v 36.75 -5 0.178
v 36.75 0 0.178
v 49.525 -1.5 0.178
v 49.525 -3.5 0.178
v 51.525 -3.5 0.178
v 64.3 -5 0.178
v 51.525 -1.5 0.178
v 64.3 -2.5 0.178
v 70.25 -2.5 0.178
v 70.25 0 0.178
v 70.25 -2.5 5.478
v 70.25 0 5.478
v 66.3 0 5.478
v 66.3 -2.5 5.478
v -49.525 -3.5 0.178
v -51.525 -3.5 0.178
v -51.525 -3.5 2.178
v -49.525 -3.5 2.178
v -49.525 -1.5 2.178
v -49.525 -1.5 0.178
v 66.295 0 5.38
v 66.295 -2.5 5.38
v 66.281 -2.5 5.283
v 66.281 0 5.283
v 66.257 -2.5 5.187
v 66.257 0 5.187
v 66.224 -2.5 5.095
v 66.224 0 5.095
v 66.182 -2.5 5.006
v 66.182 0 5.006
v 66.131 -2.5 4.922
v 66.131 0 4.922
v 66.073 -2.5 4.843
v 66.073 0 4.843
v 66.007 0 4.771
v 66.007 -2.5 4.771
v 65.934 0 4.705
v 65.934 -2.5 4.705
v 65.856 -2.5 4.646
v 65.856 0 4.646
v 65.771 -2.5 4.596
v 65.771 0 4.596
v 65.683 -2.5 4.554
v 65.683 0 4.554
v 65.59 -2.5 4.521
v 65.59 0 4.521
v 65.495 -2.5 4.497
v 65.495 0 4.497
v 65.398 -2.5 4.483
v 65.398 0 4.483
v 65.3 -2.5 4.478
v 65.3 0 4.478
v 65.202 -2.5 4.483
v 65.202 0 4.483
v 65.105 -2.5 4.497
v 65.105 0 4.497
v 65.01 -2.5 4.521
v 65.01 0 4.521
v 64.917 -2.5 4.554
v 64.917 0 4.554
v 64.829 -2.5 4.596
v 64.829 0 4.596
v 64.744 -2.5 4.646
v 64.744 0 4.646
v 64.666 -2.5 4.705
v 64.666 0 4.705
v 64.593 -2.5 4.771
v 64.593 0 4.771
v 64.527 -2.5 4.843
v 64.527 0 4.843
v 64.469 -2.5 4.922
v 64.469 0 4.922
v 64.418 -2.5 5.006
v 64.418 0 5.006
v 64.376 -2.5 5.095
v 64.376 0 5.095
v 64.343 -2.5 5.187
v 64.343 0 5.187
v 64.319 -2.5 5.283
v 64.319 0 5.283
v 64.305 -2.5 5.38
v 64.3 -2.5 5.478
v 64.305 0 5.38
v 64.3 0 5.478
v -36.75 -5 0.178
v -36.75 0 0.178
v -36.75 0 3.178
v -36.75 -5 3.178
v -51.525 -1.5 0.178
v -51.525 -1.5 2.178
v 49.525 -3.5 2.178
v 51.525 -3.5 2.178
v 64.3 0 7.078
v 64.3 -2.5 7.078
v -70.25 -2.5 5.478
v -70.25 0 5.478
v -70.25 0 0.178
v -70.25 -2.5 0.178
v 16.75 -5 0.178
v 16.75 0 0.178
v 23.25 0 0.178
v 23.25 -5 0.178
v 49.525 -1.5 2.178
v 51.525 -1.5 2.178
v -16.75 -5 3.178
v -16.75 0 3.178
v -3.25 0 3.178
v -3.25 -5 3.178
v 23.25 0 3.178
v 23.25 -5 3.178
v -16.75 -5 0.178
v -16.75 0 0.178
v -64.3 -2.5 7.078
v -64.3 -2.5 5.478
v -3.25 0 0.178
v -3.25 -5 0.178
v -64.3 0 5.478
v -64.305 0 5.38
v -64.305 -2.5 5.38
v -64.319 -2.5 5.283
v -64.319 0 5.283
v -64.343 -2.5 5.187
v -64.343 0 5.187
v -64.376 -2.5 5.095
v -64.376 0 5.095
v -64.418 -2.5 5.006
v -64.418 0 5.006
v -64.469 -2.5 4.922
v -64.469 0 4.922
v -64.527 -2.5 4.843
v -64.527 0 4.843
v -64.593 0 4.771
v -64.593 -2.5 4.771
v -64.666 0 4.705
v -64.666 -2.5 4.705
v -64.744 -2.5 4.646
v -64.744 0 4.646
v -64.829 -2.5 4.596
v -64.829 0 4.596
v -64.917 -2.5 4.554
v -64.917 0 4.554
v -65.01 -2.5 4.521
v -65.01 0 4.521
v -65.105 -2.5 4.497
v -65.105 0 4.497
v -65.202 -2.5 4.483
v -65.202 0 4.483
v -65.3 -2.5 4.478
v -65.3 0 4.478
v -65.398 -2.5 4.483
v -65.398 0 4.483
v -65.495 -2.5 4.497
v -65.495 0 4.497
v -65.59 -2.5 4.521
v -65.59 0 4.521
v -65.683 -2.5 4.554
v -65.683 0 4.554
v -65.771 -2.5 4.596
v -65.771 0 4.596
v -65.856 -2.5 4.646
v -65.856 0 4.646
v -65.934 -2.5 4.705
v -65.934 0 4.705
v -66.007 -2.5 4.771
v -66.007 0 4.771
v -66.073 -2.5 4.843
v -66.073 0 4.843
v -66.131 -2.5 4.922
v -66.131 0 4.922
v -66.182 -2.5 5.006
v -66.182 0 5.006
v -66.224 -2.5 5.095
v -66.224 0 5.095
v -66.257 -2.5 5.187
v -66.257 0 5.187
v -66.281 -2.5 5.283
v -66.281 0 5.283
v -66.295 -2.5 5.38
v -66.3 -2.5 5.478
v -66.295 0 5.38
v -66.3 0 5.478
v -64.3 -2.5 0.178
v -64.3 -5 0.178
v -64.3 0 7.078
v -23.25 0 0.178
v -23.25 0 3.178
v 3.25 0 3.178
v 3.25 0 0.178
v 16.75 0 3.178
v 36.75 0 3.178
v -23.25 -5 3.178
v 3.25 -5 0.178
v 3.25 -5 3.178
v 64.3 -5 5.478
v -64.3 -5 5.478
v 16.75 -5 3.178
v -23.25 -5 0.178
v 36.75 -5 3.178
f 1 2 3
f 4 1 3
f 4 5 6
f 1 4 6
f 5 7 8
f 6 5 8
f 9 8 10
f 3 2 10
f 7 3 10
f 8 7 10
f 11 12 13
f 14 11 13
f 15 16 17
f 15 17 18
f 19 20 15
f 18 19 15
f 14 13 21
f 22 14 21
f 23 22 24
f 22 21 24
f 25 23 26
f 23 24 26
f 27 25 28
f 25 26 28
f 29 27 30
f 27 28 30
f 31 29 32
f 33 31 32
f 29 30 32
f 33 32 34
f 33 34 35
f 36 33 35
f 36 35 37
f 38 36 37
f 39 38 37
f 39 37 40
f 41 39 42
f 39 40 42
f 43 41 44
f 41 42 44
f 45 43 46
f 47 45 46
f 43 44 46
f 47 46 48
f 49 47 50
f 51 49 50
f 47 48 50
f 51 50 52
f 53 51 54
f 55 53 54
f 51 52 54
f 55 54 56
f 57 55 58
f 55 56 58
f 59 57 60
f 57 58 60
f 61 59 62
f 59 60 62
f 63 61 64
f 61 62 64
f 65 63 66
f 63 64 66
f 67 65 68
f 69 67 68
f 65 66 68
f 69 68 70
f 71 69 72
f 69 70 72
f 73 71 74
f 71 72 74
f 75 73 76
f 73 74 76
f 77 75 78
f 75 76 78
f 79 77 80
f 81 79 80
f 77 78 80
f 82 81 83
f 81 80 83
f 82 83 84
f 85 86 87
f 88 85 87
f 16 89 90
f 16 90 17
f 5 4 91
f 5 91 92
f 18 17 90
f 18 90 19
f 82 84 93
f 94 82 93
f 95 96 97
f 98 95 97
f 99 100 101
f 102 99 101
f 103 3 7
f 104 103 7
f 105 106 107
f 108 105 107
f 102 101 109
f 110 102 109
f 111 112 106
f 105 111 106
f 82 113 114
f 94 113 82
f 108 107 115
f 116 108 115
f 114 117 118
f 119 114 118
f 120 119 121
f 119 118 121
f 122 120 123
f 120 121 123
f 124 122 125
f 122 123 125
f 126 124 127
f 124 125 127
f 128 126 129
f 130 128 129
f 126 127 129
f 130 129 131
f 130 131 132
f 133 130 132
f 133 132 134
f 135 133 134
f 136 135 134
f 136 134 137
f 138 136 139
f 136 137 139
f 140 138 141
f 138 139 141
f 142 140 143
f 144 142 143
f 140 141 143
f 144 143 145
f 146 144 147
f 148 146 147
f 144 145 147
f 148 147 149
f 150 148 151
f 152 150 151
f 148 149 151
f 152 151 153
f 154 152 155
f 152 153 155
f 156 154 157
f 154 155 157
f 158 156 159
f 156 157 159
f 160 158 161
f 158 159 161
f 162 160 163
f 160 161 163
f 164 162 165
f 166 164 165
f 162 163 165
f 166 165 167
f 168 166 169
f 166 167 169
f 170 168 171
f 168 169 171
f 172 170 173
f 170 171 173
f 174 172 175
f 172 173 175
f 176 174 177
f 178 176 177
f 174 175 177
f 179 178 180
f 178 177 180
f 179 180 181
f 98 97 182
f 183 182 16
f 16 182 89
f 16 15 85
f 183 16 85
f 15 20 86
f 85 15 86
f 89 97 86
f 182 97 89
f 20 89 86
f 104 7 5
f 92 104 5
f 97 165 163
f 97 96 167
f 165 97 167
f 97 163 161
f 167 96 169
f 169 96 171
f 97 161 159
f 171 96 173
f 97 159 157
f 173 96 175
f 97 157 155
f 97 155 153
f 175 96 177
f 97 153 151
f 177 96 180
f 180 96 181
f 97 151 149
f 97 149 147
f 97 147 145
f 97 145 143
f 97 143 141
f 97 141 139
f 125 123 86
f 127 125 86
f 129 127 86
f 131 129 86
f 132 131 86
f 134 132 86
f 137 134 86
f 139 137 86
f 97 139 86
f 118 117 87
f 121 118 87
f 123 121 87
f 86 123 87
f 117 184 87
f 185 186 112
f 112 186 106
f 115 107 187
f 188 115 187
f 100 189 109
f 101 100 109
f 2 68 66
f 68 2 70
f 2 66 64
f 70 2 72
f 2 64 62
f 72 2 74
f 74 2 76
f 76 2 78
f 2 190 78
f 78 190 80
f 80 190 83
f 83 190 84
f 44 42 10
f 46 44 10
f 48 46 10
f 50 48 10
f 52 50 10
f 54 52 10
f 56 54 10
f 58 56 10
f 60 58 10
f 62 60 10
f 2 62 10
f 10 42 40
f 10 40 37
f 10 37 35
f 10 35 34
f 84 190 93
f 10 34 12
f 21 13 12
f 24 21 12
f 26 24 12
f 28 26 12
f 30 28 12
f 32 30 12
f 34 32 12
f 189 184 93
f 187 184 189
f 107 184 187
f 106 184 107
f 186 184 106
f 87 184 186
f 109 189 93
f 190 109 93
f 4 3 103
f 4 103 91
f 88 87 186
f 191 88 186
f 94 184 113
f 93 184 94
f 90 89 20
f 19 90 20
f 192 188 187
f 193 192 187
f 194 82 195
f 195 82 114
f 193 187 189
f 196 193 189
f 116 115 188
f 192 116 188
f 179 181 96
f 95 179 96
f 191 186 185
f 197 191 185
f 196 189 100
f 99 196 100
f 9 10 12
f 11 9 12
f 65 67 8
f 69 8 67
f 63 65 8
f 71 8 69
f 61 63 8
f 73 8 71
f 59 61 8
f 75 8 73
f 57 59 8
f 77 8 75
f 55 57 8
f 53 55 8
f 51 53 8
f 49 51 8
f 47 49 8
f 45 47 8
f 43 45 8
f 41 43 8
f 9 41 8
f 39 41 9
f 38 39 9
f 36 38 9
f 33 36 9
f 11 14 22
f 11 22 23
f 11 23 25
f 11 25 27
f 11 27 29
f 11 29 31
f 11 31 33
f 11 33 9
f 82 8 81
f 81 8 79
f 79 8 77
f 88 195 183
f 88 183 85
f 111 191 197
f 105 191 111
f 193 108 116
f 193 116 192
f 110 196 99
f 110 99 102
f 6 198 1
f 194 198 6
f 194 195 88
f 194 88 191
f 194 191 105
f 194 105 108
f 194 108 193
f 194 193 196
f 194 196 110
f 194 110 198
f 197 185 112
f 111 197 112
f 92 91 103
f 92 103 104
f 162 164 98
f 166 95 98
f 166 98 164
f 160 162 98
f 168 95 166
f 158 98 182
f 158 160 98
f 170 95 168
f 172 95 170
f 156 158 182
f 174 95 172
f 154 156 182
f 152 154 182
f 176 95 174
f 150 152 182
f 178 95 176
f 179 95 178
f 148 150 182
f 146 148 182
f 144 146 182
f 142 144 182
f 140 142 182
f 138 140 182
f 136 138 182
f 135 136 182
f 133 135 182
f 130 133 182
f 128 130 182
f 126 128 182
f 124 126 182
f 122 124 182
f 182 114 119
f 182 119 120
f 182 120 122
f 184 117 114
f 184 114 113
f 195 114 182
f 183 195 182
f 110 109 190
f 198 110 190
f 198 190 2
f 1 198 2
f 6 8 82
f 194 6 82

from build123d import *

# Parameters (mm, degrees)
F1_DEPTH = 5
F0_W     = 128.6
F0_H     = 1.6
F2_DEPTH = 2.5
F3_W     = 2
F3_H     = 2
F4_DEPTH = 2
F5_W     = 2
F5_H     = 2
F6_DEPTH = 2


with BuildPart() as f1:
    # F0 (on Front) → F1 (new body)
    with BuildSketch(Plane.XZ):
        Polygon((64.3, 0.177778), (64.3, 5.477778), (-64.3, 5.477778), (-64.3, 0.177778), (-36.75, 0.177778), (-36.75, 3.177778), (-23.25, 3.177778), (-23.25, 0.177778), (-16.75, 0.177778), (-16.75, 3.177778), (-3.25, 3.177778), (-3.25, 0.177778), (3.25, 0.177778), (3.25, 3.177778), (16.75, 3.177778), (16.75, 0.177778), (23.25, 0.177778), (23.25, 3.177778), (36.75, 3.177778), (36.75, 0.177778), align=None)
    extrude(amount=F1_DEPTH)

    # F0 (on Front) → F2 (join)
    with BuildSketch(Plane.XZ):
        with BuildLine():
            Line((-64.3, 0.177778), (-64.3, 5.477778))
            ThreePointArc((-64.3, 5.477778), (-65.3, 4.477778), (-66.3, 5.477778))
            Line((-66.3, 5.477778), (-70.25, 5.477778))
            Line((-70.25, 5.477778), (-70.25, 0.177778))
            Line((-70.25, 0.177778), (-64.3, 0.177778))
        make_face()
        with Locations((0, 6.277778)):
            Rectangle(F0_W, F0_H)
        with BuildLine():
            ThreePointArc((66.3, 5.477778), (65.3, 4.477778), (64.3, 5.477778))
            Line((64.3, 5.477778), (64.3, 0.177778))
            Line((64.3, 0.177778), (70.25, 0.177778))
            Line((70.25, 0.177778), (70.25, 5.477778))
            Line((70.25, 5.477778), (66.3, 5.477778))
        make_face()
    extrude(amount=F2_DEPTH)

    # F3 (on face) → F4 (cut)
    with BuildSketch(Plane(origin=(0, 0, 0.177778), x_dir=(1, 0, 0), z_dir=(0, 0, -1))):
        with Locations((50.525, 2.5)):
            Rectangle(F3_W, F3_H)
    extrude(amount=-F4_DEPTH, mode=Mode.SUBTRACT)

    # F5 (on face) → F6 (cut)
    with BuildSketch(Plane(origin=(0, 0, 0.177778), x_dir=(1, 0, 0), z_dir=(0, 0, -1))):
        with Locations((-50.525, 2.5)):
            Rectangle(F5_W, F5_H)
    extrude(amount=-F6_DEPTH, mode=Mode.SUBTRACT)


solid = f1.part
